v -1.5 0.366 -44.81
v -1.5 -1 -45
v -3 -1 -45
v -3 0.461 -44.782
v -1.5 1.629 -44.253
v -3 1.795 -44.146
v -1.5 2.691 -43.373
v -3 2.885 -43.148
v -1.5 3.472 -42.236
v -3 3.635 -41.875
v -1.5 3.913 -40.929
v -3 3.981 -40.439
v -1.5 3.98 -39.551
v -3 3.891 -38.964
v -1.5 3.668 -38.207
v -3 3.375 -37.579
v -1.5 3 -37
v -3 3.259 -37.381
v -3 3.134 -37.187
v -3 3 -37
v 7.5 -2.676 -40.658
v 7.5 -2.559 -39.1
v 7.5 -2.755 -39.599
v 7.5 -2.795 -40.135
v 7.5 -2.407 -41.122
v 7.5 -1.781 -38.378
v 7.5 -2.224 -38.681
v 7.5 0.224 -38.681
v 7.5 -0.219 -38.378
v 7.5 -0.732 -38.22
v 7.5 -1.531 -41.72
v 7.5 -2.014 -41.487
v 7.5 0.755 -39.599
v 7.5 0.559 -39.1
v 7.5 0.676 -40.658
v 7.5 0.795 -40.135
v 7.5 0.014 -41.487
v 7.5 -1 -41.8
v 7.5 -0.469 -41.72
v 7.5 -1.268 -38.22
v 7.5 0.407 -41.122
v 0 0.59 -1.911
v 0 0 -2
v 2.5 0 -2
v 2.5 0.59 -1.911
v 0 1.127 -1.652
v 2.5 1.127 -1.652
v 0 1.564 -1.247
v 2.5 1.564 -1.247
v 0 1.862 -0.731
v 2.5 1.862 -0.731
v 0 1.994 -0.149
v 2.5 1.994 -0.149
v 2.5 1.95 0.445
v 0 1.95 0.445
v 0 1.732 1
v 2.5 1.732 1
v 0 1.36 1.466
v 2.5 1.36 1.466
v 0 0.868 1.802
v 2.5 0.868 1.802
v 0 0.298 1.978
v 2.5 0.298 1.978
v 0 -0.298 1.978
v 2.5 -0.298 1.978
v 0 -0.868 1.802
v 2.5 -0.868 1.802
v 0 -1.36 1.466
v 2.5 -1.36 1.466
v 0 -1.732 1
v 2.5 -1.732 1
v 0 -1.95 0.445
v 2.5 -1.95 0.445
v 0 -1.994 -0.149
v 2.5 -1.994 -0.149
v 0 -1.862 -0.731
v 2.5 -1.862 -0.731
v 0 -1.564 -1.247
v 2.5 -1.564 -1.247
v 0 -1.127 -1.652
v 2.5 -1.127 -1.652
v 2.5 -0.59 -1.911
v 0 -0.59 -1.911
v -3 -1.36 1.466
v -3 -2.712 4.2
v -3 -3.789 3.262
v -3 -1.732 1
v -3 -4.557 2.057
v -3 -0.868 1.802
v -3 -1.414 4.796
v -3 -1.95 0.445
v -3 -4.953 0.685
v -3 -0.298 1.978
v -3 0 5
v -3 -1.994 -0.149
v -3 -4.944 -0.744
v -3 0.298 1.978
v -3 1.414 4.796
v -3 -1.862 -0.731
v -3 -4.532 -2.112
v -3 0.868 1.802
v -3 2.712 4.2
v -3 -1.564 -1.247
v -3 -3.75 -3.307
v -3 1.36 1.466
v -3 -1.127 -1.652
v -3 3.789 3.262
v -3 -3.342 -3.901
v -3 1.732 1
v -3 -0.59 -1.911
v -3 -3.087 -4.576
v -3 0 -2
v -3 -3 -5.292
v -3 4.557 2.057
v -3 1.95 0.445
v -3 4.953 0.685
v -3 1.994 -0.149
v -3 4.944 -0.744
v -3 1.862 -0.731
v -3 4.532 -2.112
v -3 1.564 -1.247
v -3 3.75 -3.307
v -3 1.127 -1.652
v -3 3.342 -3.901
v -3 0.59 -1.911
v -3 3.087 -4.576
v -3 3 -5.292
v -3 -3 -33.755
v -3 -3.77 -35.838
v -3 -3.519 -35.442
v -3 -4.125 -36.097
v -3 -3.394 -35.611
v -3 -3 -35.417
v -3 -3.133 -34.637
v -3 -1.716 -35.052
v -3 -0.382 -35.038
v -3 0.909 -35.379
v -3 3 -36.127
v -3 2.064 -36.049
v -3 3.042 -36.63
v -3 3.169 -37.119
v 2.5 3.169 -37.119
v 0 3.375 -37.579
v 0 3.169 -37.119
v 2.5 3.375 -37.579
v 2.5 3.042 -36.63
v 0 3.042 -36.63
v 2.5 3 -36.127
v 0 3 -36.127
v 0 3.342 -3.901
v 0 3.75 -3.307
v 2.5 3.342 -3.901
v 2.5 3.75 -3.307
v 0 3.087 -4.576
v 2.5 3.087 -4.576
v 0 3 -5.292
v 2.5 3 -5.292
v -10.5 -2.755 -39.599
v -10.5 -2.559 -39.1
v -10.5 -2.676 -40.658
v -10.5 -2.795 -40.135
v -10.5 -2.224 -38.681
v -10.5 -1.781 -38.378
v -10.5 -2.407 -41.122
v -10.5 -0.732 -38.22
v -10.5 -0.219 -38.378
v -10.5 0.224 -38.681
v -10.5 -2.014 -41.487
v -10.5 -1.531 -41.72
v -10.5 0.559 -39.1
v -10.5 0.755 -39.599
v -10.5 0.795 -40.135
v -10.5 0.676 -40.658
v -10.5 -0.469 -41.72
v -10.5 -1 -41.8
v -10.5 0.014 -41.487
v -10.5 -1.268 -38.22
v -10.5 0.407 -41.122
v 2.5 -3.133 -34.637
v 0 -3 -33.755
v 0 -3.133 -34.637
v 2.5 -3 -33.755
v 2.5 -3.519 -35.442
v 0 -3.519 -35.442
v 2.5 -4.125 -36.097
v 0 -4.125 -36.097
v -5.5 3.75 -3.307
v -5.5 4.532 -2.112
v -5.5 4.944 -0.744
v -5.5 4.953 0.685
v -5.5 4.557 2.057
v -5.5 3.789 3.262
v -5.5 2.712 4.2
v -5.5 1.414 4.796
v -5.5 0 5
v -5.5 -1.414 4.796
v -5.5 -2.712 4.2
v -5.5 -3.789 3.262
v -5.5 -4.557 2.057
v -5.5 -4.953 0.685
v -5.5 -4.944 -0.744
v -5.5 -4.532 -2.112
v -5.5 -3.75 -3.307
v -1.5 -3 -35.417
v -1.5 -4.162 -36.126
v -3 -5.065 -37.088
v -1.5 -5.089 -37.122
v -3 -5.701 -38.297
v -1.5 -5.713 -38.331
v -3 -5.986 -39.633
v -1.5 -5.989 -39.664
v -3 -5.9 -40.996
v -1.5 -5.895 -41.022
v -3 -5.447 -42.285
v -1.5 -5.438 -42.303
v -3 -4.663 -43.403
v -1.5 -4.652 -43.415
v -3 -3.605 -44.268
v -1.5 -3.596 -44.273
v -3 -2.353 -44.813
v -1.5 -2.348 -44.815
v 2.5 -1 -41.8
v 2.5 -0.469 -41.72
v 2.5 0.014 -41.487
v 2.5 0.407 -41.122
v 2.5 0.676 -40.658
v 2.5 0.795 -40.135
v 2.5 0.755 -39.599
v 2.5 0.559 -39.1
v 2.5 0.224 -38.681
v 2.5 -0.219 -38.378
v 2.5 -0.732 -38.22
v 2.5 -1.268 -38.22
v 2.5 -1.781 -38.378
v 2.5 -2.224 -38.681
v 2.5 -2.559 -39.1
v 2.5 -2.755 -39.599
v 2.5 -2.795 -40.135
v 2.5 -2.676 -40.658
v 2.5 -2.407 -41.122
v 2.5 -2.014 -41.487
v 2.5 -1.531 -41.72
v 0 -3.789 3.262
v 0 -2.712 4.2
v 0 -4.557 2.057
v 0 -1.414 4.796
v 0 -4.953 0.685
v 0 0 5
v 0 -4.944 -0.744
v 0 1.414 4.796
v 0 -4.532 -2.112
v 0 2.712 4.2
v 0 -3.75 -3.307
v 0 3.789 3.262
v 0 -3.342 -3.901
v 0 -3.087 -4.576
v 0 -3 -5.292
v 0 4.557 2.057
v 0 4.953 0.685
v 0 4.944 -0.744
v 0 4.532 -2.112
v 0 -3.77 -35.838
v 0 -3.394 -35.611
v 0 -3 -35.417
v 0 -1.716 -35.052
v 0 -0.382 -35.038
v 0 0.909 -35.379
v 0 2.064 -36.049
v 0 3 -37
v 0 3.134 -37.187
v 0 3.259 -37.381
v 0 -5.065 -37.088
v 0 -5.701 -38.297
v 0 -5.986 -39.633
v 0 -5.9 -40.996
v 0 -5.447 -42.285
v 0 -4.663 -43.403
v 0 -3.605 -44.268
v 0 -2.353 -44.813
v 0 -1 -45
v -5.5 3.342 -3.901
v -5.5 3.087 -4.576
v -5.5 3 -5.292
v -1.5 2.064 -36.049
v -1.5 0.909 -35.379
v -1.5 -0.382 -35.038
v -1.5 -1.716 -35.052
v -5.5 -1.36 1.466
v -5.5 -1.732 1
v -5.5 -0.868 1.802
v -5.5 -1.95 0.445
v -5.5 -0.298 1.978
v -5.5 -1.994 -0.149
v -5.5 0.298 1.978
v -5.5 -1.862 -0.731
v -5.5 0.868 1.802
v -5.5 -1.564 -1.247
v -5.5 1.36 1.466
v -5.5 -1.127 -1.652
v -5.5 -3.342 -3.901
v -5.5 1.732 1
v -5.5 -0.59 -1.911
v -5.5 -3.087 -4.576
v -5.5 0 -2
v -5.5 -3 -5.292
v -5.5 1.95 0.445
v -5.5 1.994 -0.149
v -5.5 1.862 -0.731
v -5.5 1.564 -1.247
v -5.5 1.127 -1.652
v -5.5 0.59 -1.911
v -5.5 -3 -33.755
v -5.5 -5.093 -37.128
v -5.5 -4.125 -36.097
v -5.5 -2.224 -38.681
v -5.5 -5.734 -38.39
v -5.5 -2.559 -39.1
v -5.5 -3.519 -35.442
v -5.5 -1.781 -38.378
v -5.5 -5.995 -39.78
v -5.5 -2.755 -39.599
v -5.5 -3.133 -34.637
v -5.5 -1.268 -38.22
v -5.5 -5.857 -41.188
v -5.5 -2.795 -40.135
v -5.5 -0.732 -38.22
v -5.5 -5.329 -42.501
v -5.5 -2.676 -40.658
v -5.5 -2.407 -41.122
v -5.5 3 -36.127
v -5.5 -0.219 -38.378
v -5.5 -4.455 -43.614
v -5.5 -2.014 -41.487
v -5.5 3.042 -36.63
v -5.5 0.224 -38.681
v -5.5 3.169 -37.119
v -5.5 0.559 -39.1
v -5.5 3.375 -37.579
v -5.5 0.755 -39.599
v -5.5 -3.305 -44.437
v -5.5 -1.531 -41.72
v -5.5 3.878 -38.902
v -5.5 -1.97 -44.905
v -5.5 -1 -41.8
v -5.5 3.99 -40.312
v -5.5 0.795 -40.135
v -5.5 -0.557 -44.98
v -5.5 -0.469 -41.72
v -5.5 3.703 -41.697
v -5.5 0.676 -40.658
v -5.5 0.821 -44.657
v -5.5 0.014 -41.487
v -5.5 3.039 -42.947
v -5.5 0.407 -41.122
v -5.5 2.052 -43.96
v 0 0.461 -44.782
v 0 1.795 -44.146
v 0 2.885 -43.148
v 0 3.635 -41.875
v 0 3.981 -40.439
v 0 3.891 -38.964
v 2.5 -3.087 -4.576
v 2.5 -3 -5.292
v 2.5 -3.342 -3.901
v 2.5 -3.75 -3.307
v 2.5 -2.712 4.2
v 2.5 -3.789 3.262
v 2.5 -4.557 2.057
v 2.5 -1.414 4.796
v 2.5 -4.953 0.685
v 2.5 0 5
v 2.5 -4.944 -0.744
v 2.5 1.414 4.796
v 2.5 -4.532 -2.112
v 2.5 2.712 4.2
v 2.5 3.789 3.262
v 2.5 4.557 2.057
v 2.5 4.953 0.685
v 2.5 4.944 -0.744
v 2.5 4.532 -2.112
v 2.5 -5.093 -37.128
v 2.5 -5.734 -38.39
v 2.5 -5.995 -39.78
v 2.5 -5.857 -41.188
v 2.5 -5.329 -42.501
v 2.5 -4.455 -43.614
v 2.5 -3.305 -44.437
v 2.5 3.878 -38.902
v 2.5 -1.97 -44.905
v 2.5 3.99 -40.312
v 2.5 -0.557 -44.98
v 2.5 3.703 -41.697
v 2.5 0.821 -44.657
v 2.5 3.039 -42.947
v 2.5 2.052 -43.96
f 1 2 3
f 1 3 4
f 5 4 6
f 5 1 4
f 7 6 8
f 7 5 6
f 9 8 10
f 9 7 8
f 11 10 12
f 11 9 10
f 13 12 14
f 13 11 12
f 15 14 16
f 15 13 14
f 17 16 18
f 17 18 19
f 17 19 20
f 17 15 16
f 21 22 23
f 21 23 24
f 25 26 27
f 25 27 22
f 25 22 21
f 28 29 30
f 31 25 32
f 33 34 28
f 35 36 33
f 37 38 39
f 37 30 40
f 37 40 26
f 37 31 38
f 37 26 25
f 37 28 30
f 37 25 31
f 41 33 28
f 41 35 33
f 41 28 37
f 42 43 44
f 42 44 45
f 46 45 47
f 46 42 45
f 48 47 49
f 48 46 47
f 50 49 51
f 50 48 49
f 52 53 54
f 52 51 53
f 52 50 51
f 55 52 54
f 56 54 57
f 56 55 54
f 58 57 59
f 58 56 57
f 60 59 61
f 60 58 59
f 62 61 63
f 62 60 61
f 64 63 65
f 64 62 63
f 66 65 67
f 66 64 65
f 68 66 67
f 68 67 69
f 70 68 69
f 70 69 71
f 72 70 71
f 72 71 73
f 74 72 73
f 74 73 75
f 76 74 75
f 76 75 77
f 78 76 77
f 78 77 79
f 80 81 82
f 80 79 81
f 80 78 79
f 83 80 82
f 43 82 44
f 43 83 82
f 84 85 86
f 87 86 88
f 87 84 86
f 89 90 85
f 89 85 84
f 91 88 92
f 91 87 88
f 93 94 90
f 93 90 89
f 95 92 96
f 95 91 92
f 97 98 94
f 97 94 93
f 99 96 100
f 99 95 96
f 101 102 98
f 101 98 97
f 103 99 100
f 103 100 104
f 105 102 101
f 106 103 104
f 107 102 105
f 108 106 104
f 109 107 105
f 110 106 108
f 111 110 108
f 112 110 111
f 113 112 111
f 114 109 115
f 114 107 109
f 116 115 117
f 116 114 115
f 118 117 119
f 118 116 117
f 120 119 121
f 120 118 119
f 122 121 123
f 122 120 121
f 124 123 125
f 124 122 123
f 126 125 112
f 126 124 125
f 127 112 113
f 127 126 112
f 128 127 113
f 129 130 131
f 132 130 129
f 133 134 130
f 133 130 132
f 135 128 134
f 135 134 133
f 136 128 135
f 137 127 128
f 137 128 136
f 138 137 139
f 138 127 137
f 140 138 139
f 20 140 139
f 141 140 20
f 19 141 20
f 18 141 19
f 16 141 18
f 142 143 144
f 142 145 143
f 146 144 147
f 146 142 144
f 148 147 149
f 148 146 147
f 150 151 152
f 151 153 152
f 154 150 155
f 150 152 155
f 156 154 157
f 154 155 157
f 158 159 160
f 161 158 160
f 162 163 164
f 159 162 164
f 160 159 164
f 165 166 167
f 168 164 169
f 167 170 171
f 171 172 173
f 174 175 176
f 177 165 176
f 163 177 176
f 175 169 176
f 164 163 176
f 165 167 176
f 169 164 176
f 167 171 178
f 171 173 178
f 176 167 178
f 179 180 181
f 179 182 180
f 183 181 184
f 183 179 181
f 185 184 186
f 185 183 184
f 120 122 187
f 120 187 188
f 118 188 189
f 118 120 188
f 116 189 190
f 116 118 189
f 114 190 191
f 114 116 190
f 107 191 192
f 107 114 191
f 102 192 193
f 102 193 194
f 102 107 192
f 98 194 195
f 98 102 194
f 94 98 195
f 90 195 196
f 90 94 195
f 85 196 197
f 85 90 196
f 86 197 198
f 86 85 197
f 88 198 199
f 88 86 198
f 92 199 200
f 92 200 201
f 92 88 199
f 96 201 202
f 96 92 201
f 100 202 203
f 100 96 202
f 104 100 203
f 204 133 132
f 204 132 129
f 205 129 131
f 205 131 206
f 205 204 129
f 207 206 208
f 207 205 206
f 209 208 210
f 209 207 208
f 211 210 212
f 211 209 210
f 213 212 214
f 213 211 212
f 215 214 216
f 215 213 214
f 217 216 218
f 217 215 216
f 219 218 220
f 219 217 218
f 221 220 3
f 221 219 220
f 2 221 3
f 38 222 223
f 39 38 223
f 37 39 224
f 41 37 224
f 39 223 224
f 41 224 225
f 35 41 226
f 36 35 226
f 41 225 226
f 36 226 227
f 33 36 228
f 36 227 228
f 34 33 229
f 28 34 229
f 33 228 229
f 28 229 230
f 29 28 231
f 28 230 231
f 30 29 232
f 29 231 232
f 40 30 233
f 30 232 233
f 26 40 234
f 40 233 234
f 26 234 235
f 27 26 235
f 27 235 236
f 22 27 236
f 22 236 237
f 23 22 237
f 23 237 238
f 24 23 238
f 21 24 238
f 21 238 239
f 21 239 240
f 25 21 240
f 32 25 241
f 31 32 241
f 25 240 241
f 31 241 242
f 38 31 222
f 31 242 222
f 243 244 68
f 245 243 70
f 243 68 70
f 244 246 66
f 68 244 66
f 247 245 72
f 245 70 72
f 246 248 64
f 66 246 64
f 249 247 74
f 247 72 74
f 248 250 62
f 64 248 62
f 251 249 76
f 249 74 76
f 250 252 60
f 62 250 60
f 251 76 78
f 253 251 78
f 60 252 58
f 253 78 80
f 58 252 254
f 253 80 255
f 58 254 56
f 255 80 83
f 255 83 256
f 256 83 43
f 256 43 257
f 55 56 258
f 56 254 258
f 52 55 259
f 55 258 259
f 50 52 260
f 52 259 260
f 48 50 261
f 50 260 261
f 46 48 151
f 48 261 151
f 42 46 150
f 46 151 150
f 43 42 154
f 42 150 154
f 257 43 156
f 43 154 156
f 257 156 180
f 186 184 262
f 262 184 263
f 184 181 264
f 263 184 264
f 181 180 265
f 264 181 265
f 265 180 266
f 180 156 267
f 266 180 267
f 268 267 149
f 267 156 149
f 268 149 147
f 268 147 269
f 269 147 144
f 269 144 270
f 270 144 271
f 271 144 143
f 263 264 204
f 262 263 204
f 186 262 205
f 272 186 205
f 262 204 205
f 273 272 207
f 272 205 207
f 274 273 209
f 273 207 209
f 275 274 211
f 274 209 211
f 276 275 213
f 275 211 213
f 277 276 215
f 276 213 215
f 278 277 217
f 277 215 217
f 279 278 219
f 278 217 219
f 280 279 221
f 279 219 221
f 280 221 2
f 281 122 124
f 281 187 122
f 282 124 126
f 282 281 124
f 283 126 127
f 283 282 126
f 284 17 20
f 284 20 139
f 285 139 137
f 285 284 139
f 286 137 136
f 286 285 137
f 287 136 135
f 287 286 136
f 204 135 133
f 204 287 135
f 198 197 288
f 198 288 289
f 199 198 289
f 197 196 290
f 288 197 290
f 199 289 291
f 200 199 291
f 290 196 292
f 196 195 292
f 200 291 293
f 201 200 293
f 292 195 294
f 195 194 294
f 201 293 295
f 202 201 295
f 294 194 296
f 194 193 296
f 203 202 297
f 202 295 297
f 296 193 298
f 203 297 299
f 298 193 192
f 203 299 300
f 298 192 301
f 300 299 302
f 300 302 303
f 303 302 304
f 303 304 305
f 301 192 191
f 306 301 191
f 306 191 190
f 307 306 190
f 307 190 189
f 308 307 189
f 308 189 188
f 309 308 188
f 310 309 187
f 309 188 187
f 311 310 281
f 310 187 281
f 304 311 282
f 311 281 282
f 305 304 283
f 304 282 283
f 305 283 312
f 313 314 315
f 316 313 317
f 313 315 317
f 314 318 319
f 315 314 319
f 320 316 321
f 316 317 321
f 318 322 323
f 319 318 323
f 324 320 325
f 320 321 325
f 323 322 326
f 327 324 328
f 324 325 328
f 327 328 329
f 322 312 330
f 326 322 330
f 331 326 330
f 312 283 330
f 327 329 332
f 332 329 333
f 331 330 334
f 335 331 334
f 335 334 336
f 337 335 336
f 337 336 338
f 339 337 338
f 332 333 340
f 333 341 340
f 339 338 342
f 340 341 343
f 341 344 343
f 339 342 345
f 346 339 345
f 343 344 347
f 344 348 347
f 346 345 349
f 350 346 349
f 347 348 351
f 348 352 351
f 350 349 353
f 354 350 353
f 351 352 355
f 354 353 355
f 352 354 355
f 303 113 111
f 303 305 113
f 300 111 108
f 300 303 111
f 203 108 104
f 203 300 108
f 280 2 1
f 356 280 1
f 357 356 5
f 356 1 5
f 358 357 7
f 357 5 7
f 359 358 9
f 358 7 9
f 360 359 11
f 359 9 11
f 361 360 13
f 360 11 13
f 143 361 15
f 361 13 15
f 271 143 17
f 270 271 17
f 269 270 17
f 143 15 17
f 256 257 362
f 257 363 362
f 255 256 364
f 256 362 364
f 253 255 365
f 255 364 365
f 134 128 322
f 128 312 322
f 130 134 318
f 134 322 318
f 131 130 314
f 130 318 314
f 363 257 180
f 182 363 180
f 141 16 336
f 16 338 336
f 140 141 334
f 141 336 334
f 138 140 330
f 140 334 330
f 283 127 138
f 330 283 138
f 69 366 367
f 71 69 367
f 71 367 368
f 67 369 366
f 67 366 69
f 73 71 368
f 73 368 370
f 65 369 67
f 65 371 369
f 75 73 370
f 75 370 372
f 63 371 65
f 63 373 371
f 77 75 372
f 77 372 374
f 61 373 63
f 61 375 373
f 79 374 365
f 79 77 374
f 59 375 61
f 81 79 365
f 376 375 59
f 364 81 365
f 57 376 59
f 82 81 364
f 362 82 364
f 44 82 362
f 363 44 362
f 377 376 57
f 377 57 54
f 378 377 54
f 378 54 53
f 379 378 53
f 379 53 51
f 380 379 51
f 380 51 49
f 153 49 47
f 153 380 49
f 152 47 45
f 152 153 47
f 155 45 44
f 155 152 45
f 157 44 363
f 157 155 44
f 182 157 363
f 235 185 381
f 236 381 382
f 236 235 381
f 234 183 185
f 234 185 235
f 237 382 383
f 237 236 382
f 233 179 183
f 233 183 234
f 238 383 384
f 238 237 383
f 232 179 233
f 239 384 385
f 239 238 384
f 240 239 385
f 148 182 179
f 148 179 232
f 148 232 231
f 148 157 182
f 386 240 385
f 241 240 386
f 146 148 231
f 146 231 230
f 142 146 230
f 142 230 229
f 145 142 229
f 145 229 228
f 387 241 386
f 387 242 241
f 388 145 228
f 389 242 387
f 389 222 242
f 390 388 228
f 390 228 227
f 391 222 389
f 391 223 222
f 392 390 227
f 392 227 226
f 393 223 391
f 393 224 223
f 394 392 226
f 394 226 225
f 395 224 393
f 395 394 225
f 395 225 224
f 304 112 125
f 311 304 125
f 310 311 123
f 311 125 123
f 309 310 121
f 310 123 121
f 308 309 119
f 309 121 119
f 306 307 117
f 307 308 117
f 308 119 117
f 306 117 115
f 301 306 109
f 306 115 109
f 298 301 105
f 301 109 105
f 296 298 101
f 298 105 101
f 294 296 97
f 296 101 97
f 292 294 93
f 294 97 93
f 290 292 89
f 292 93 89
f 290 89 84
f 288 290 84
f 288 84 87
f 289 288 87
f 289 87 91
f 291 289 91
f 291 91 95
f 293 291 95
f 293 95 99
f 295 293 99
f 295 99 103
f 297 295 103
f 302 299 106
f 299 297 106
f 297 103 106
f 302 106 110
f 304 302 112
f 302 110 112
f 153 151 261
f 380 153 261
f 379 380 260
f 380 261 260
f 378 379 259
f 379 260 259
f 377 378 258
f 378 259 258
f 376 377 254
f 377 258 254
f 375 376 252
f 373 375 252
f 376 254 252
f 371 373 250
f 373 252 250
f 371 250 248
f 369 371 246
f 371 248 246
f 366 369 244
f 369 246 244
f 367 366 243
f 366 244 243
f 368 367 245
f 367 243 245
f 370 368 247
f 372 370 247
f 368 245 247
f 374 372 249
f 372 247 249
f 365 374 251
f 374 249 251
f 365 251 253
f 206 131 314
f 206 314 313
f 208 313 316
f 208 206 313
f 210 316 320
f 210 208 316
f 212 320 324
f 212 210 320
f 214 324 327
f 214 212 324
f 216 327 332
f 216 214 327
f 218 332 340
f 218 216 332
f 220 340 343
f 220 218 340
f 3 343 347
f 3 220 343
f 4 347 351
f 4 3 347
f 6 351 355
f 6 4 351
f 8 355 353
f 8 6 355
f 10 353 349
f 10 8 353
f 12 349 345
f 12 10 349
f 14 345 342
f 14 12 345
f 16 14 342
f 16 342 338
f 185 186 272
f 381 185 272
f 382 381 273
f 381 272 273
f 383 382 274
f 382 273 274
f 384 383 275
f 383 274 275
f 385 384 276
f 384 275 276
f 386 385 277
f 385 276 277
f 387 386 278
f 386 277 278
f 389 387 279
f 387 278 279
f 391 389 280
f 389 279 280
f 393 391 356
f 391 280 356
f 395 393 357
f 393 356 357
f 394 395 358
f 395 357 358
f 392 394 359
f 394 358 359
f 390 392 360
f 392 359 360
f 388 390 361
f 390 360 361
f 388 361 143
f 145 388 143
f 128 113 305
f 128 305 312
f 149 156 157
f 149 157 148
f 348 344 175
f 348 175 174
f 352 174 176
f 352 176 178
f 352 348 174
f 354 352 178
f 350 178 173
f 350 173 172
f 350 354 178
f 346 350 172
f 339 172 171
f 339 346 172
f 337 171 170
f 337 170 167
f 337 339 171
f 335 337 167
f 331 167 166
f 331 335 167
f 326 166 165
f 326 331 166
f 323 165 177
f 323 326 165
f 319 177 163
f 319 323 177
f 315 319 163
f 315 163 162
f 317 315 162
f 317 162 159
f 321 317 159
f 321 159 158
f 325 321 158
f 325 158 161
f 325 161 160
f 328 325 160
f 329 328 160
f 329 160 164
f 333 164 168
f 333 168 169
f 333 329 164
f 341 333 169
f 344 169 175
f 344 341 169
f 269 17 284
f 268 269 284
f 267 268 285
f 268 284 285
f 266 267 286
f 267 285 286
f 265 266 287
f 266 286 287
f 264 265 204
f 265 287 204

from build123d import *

# Parameters (mm, degrees)
SKETCH_1_R                  = 5
SKETCH_1_W                  = 40
SKETCH_1_H                  = 6
EXTRUDE_1_DEPTH             = 2.5
CUT_EXTRUDE_2_DEPTH         = 46.467021015
CUT_EXTRUDE_2_DEPTH_BACK    = 46.467021015
SKETCH_1_3_R                = 2
FILLET_1_R                  = 3
EXTRUDE_START               = -1.5
SKETCH_1_4_R                = 5
SKETCH_1_4_R_2              = 2
EXTRUDE_2_DEPTH             = 1.5
SKETCH_2_R                  = 1.8
EXTRUDE_4_DEPTH             = 5
EXTRUDE_5_REACH             = 48.014
SKETCH_1_5_R                = 2
EXTRUDE_5_DIRECTION_2_REACH = 48.014


with BuildPart() as part:
    # 草图1 → 凸台-拉伸1 (new body)
    with BuildSketch(Plane(origin=(0, 0, 0), x_dir=(0, 0, -1), z_dir=(1, 0, 0))):
        Circle(SKETCH_1_R)
        with Locations((40, -1)):
            Circle(SKETCH_1_R)
        with Locations((20, 0)):
            Rectangle(SKETCH_1_W, SKETCH_1_H)
    extrude(amount=EXTRUDE_1_DEPTH)

    # 草图1<3> → 切除-拉伸2 (cut, two sides: drawn at the far end of the back side and taken through both)
    with BuildSketch(Plane(origin=(0, 0, 0), x_dir=(0, 0, -1), z_dir=(1, 0, 0)).offset(-CUT_EXTRUDE_2_DEPTH_BACK)):
        Circle(SKETCH_1_3_R)
        with Locations((40, -1)):
            Circle(SKETCH_1_3_R)
    extrude(amount=CUT_EXTRUDE_2_DEPTH + CUT_EXTRUDE_2_DEPTH_BACK, mode=Mode.SUBTRACT)

    # 圆角1
    fillet_1_edges = [part.edges().sort_by_distance(p)[0] for p in [
        (1.25, -3, -4),
        (1.25, -3, -35.417424305),
        (1.25, 3, -37),
        (1.25, 3, -4),
    ]]
    fillet(fillet_1_edges, radius=FILLET_1_R)

    # 草图1<4> → 凸台-拉伸2 (add)
    with BuildSketch(Plane(origin=(0, 0, 0), x_dir=(0, 0, -1), z_dir=(1, 0, 0)).offset(EXTRUDE_START)):
        with Locations((40, -1)):
            Circle(SKETCH_1_4_R)
        with Locations((40, -1)):
            Circle(SKETCH_1_4_R_2, mode=Mode.SUBTRACT)
    extrude(amount=EXTRUDE_2_DEPTH)

    # 凸台-拉伸5: up to this face of the body (flat: up to its plane)
    extrude_5_end = Plane(part.part.faces().sort_by_distance((2.5, -0.197791912, -20.041492076))[0])
    # 草图1<5> → 凸台-拉伸5 (add, up to the picked face)
    with BuildSketch(Plane(origin=(0, 0, 0), x_dir=(0, 0, -1), z_dir=(1, 0, 0)), mode=Mode.PRIVATE) as extrude_5_sk1:
        with Locations((40, -1)):
            Circle(SKETCH_1_5_R)
    extrude_5_tool1 = split(extrude(extrude_5_sk1.sketch, amount=EXTRUDE_5_REACH, mode=Mode.PRIVATE), bisect_by=extrude_5_end, keep=Keep.BOTH, mode=Mode.PRIVATE)


with BuildPart() as body_2:
    # 草图2 → 凸台-拉伸4 (new body)
    with BuildSketch(Plane(origin=(2.5, 0, 0), x_dir=(0, 0, -1), z_dir=(1, 0, 0))):
        with Locations((40, -1)):
            Circle(SKETCH_2_R)
    extrude(amount=EXTRUDE_4_DEPTH)


with BuildPart() as part_1:
    add(part.part)

    add(body_2.part)  # 凸台-拉伸5 merges body 2
    add(extrude_5_tool1.solids().sort_by(Axis((0, -1, -40), (1, 0, 0)))[0])

    # 凸台-拉伸5 direction 2: up to this face of the body (flat: up to its plane)
    extrude_5_direction_2_end = Plane(part_1.part.faces().sort_by_distance((-1.5, -1, -35.141421356))[0])
    # 草图1<5> → 凸台-拉伸5 direction 2 (add, up to the picked face)
    with BuildSketch(Plane(origin=(0, 0, 0), x_dir=(0, 0, -1), z_dir=(1, 0, 0)), mode=Mode.PRIVATE) as extrude_5_direction_2_sk1:
        with Locations((40, -1)):
            Circle(SKETCH_1_5_R)
    extrude_5_direction_2_tool1 = split(extrude(extrude_5_direction_2_sk1.sketch, amount=-EXTRUDE_5_DIRECTION_2_REACH, mode=Mode.PRIVATE), bisect_by=extrude_5_direction_2_end, keep=Keep.BOTH, mode=Mode.PRIVATE)
    add(extrude_5_direction_2_tool1.solids().sort_by(Axis((0, -1, -40), (-1, 0, 0)))[0])

    # 镜向3: part across plane


with BuildPart() as part_2:
    add(part_1.part)
    add(part_1.part.mirror(Plane.ZY.offset(1.5)))


solid = part_2.part
